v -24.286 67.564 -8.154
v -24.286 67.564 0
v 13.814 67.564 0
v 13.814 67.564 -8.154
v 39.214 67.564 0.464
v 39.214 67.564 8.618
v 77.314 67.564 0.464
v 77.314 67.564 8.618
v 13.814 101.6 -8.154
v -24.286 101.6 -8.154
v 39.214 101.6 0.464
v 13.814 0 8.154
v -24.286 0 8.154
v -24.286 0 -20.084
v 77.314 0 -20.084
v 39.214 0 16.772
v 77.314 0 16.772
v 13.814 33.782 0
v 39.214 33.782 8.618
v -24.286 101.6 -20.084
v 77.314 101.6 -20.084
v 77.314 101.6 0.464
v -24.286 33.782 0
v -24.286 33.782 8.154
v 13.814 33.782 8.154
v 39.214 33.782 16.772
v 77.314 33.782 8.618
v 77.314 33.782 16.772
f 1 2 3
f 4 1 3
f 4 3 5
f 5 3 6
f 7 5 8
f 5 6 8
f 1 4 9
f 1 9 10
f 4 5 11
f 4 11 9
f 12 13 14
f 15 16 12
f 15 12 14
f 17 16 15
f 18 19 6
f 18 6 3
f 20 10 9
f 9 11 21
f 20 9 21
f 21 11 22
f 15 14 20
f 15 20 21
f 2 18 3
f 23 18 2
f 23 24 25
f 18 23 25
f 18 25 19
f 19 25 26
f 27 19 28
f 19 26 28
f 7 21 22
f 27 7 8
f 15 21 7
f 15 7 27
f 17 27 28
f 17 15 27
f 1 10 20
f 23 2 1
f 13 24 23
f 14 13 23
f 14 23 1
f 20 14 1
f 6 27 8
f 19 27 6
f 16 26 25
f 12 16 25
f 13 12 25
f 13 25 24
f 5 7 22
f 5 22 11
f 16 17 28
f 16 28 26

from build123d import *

# Parameters (mm, degrees)
F1_DEPTH = 101.6
F2_DEPTH = 67.564
F3_DEPTH = 33.782


with BuildPart() as f1:
    # F0 (on Front) → F1 (new body)
    with BuildSketch(Plane.XZ):
        Polygon((-24.286251, -20.083786), (77.313749, -20.083786), (77.313749, 0.464413), (39.213749, 0.464413), (13.813749, -8.153985), (-24.286251, -8.153985), align=None)
    extrude(amount=-F1_DEPTH)

    # F0 (on Front) → F2 (join)
    with BuildSketch(Plane.XZ):
        Polygon((39.213749, 0.464413), (77.313749, 0.464413), (77.313749, 8.618398), (39.213749, 8.618398), (13.813749, 0), (-24.286251, 0), (-24.286251, -8.153985), (13.813749, -8.153985), align=None)
    extrude(amount=-F2_DEPTH)

    # F0 (on Front) → F3 (join)
    with BuildSketch(Plane.XZ):
        Polygon((39.213749, 8.618398), (77.313749, 8.618398), (77.313749, 16.772382), (39.213749, 16.772382), (13.813749, 8.153985), (-24.286251, 8.153985), (-24.286251, 0), (13.813749, 0), align=None)
    extrude(amount=-F3_DEPTH)


solid = f1.part
